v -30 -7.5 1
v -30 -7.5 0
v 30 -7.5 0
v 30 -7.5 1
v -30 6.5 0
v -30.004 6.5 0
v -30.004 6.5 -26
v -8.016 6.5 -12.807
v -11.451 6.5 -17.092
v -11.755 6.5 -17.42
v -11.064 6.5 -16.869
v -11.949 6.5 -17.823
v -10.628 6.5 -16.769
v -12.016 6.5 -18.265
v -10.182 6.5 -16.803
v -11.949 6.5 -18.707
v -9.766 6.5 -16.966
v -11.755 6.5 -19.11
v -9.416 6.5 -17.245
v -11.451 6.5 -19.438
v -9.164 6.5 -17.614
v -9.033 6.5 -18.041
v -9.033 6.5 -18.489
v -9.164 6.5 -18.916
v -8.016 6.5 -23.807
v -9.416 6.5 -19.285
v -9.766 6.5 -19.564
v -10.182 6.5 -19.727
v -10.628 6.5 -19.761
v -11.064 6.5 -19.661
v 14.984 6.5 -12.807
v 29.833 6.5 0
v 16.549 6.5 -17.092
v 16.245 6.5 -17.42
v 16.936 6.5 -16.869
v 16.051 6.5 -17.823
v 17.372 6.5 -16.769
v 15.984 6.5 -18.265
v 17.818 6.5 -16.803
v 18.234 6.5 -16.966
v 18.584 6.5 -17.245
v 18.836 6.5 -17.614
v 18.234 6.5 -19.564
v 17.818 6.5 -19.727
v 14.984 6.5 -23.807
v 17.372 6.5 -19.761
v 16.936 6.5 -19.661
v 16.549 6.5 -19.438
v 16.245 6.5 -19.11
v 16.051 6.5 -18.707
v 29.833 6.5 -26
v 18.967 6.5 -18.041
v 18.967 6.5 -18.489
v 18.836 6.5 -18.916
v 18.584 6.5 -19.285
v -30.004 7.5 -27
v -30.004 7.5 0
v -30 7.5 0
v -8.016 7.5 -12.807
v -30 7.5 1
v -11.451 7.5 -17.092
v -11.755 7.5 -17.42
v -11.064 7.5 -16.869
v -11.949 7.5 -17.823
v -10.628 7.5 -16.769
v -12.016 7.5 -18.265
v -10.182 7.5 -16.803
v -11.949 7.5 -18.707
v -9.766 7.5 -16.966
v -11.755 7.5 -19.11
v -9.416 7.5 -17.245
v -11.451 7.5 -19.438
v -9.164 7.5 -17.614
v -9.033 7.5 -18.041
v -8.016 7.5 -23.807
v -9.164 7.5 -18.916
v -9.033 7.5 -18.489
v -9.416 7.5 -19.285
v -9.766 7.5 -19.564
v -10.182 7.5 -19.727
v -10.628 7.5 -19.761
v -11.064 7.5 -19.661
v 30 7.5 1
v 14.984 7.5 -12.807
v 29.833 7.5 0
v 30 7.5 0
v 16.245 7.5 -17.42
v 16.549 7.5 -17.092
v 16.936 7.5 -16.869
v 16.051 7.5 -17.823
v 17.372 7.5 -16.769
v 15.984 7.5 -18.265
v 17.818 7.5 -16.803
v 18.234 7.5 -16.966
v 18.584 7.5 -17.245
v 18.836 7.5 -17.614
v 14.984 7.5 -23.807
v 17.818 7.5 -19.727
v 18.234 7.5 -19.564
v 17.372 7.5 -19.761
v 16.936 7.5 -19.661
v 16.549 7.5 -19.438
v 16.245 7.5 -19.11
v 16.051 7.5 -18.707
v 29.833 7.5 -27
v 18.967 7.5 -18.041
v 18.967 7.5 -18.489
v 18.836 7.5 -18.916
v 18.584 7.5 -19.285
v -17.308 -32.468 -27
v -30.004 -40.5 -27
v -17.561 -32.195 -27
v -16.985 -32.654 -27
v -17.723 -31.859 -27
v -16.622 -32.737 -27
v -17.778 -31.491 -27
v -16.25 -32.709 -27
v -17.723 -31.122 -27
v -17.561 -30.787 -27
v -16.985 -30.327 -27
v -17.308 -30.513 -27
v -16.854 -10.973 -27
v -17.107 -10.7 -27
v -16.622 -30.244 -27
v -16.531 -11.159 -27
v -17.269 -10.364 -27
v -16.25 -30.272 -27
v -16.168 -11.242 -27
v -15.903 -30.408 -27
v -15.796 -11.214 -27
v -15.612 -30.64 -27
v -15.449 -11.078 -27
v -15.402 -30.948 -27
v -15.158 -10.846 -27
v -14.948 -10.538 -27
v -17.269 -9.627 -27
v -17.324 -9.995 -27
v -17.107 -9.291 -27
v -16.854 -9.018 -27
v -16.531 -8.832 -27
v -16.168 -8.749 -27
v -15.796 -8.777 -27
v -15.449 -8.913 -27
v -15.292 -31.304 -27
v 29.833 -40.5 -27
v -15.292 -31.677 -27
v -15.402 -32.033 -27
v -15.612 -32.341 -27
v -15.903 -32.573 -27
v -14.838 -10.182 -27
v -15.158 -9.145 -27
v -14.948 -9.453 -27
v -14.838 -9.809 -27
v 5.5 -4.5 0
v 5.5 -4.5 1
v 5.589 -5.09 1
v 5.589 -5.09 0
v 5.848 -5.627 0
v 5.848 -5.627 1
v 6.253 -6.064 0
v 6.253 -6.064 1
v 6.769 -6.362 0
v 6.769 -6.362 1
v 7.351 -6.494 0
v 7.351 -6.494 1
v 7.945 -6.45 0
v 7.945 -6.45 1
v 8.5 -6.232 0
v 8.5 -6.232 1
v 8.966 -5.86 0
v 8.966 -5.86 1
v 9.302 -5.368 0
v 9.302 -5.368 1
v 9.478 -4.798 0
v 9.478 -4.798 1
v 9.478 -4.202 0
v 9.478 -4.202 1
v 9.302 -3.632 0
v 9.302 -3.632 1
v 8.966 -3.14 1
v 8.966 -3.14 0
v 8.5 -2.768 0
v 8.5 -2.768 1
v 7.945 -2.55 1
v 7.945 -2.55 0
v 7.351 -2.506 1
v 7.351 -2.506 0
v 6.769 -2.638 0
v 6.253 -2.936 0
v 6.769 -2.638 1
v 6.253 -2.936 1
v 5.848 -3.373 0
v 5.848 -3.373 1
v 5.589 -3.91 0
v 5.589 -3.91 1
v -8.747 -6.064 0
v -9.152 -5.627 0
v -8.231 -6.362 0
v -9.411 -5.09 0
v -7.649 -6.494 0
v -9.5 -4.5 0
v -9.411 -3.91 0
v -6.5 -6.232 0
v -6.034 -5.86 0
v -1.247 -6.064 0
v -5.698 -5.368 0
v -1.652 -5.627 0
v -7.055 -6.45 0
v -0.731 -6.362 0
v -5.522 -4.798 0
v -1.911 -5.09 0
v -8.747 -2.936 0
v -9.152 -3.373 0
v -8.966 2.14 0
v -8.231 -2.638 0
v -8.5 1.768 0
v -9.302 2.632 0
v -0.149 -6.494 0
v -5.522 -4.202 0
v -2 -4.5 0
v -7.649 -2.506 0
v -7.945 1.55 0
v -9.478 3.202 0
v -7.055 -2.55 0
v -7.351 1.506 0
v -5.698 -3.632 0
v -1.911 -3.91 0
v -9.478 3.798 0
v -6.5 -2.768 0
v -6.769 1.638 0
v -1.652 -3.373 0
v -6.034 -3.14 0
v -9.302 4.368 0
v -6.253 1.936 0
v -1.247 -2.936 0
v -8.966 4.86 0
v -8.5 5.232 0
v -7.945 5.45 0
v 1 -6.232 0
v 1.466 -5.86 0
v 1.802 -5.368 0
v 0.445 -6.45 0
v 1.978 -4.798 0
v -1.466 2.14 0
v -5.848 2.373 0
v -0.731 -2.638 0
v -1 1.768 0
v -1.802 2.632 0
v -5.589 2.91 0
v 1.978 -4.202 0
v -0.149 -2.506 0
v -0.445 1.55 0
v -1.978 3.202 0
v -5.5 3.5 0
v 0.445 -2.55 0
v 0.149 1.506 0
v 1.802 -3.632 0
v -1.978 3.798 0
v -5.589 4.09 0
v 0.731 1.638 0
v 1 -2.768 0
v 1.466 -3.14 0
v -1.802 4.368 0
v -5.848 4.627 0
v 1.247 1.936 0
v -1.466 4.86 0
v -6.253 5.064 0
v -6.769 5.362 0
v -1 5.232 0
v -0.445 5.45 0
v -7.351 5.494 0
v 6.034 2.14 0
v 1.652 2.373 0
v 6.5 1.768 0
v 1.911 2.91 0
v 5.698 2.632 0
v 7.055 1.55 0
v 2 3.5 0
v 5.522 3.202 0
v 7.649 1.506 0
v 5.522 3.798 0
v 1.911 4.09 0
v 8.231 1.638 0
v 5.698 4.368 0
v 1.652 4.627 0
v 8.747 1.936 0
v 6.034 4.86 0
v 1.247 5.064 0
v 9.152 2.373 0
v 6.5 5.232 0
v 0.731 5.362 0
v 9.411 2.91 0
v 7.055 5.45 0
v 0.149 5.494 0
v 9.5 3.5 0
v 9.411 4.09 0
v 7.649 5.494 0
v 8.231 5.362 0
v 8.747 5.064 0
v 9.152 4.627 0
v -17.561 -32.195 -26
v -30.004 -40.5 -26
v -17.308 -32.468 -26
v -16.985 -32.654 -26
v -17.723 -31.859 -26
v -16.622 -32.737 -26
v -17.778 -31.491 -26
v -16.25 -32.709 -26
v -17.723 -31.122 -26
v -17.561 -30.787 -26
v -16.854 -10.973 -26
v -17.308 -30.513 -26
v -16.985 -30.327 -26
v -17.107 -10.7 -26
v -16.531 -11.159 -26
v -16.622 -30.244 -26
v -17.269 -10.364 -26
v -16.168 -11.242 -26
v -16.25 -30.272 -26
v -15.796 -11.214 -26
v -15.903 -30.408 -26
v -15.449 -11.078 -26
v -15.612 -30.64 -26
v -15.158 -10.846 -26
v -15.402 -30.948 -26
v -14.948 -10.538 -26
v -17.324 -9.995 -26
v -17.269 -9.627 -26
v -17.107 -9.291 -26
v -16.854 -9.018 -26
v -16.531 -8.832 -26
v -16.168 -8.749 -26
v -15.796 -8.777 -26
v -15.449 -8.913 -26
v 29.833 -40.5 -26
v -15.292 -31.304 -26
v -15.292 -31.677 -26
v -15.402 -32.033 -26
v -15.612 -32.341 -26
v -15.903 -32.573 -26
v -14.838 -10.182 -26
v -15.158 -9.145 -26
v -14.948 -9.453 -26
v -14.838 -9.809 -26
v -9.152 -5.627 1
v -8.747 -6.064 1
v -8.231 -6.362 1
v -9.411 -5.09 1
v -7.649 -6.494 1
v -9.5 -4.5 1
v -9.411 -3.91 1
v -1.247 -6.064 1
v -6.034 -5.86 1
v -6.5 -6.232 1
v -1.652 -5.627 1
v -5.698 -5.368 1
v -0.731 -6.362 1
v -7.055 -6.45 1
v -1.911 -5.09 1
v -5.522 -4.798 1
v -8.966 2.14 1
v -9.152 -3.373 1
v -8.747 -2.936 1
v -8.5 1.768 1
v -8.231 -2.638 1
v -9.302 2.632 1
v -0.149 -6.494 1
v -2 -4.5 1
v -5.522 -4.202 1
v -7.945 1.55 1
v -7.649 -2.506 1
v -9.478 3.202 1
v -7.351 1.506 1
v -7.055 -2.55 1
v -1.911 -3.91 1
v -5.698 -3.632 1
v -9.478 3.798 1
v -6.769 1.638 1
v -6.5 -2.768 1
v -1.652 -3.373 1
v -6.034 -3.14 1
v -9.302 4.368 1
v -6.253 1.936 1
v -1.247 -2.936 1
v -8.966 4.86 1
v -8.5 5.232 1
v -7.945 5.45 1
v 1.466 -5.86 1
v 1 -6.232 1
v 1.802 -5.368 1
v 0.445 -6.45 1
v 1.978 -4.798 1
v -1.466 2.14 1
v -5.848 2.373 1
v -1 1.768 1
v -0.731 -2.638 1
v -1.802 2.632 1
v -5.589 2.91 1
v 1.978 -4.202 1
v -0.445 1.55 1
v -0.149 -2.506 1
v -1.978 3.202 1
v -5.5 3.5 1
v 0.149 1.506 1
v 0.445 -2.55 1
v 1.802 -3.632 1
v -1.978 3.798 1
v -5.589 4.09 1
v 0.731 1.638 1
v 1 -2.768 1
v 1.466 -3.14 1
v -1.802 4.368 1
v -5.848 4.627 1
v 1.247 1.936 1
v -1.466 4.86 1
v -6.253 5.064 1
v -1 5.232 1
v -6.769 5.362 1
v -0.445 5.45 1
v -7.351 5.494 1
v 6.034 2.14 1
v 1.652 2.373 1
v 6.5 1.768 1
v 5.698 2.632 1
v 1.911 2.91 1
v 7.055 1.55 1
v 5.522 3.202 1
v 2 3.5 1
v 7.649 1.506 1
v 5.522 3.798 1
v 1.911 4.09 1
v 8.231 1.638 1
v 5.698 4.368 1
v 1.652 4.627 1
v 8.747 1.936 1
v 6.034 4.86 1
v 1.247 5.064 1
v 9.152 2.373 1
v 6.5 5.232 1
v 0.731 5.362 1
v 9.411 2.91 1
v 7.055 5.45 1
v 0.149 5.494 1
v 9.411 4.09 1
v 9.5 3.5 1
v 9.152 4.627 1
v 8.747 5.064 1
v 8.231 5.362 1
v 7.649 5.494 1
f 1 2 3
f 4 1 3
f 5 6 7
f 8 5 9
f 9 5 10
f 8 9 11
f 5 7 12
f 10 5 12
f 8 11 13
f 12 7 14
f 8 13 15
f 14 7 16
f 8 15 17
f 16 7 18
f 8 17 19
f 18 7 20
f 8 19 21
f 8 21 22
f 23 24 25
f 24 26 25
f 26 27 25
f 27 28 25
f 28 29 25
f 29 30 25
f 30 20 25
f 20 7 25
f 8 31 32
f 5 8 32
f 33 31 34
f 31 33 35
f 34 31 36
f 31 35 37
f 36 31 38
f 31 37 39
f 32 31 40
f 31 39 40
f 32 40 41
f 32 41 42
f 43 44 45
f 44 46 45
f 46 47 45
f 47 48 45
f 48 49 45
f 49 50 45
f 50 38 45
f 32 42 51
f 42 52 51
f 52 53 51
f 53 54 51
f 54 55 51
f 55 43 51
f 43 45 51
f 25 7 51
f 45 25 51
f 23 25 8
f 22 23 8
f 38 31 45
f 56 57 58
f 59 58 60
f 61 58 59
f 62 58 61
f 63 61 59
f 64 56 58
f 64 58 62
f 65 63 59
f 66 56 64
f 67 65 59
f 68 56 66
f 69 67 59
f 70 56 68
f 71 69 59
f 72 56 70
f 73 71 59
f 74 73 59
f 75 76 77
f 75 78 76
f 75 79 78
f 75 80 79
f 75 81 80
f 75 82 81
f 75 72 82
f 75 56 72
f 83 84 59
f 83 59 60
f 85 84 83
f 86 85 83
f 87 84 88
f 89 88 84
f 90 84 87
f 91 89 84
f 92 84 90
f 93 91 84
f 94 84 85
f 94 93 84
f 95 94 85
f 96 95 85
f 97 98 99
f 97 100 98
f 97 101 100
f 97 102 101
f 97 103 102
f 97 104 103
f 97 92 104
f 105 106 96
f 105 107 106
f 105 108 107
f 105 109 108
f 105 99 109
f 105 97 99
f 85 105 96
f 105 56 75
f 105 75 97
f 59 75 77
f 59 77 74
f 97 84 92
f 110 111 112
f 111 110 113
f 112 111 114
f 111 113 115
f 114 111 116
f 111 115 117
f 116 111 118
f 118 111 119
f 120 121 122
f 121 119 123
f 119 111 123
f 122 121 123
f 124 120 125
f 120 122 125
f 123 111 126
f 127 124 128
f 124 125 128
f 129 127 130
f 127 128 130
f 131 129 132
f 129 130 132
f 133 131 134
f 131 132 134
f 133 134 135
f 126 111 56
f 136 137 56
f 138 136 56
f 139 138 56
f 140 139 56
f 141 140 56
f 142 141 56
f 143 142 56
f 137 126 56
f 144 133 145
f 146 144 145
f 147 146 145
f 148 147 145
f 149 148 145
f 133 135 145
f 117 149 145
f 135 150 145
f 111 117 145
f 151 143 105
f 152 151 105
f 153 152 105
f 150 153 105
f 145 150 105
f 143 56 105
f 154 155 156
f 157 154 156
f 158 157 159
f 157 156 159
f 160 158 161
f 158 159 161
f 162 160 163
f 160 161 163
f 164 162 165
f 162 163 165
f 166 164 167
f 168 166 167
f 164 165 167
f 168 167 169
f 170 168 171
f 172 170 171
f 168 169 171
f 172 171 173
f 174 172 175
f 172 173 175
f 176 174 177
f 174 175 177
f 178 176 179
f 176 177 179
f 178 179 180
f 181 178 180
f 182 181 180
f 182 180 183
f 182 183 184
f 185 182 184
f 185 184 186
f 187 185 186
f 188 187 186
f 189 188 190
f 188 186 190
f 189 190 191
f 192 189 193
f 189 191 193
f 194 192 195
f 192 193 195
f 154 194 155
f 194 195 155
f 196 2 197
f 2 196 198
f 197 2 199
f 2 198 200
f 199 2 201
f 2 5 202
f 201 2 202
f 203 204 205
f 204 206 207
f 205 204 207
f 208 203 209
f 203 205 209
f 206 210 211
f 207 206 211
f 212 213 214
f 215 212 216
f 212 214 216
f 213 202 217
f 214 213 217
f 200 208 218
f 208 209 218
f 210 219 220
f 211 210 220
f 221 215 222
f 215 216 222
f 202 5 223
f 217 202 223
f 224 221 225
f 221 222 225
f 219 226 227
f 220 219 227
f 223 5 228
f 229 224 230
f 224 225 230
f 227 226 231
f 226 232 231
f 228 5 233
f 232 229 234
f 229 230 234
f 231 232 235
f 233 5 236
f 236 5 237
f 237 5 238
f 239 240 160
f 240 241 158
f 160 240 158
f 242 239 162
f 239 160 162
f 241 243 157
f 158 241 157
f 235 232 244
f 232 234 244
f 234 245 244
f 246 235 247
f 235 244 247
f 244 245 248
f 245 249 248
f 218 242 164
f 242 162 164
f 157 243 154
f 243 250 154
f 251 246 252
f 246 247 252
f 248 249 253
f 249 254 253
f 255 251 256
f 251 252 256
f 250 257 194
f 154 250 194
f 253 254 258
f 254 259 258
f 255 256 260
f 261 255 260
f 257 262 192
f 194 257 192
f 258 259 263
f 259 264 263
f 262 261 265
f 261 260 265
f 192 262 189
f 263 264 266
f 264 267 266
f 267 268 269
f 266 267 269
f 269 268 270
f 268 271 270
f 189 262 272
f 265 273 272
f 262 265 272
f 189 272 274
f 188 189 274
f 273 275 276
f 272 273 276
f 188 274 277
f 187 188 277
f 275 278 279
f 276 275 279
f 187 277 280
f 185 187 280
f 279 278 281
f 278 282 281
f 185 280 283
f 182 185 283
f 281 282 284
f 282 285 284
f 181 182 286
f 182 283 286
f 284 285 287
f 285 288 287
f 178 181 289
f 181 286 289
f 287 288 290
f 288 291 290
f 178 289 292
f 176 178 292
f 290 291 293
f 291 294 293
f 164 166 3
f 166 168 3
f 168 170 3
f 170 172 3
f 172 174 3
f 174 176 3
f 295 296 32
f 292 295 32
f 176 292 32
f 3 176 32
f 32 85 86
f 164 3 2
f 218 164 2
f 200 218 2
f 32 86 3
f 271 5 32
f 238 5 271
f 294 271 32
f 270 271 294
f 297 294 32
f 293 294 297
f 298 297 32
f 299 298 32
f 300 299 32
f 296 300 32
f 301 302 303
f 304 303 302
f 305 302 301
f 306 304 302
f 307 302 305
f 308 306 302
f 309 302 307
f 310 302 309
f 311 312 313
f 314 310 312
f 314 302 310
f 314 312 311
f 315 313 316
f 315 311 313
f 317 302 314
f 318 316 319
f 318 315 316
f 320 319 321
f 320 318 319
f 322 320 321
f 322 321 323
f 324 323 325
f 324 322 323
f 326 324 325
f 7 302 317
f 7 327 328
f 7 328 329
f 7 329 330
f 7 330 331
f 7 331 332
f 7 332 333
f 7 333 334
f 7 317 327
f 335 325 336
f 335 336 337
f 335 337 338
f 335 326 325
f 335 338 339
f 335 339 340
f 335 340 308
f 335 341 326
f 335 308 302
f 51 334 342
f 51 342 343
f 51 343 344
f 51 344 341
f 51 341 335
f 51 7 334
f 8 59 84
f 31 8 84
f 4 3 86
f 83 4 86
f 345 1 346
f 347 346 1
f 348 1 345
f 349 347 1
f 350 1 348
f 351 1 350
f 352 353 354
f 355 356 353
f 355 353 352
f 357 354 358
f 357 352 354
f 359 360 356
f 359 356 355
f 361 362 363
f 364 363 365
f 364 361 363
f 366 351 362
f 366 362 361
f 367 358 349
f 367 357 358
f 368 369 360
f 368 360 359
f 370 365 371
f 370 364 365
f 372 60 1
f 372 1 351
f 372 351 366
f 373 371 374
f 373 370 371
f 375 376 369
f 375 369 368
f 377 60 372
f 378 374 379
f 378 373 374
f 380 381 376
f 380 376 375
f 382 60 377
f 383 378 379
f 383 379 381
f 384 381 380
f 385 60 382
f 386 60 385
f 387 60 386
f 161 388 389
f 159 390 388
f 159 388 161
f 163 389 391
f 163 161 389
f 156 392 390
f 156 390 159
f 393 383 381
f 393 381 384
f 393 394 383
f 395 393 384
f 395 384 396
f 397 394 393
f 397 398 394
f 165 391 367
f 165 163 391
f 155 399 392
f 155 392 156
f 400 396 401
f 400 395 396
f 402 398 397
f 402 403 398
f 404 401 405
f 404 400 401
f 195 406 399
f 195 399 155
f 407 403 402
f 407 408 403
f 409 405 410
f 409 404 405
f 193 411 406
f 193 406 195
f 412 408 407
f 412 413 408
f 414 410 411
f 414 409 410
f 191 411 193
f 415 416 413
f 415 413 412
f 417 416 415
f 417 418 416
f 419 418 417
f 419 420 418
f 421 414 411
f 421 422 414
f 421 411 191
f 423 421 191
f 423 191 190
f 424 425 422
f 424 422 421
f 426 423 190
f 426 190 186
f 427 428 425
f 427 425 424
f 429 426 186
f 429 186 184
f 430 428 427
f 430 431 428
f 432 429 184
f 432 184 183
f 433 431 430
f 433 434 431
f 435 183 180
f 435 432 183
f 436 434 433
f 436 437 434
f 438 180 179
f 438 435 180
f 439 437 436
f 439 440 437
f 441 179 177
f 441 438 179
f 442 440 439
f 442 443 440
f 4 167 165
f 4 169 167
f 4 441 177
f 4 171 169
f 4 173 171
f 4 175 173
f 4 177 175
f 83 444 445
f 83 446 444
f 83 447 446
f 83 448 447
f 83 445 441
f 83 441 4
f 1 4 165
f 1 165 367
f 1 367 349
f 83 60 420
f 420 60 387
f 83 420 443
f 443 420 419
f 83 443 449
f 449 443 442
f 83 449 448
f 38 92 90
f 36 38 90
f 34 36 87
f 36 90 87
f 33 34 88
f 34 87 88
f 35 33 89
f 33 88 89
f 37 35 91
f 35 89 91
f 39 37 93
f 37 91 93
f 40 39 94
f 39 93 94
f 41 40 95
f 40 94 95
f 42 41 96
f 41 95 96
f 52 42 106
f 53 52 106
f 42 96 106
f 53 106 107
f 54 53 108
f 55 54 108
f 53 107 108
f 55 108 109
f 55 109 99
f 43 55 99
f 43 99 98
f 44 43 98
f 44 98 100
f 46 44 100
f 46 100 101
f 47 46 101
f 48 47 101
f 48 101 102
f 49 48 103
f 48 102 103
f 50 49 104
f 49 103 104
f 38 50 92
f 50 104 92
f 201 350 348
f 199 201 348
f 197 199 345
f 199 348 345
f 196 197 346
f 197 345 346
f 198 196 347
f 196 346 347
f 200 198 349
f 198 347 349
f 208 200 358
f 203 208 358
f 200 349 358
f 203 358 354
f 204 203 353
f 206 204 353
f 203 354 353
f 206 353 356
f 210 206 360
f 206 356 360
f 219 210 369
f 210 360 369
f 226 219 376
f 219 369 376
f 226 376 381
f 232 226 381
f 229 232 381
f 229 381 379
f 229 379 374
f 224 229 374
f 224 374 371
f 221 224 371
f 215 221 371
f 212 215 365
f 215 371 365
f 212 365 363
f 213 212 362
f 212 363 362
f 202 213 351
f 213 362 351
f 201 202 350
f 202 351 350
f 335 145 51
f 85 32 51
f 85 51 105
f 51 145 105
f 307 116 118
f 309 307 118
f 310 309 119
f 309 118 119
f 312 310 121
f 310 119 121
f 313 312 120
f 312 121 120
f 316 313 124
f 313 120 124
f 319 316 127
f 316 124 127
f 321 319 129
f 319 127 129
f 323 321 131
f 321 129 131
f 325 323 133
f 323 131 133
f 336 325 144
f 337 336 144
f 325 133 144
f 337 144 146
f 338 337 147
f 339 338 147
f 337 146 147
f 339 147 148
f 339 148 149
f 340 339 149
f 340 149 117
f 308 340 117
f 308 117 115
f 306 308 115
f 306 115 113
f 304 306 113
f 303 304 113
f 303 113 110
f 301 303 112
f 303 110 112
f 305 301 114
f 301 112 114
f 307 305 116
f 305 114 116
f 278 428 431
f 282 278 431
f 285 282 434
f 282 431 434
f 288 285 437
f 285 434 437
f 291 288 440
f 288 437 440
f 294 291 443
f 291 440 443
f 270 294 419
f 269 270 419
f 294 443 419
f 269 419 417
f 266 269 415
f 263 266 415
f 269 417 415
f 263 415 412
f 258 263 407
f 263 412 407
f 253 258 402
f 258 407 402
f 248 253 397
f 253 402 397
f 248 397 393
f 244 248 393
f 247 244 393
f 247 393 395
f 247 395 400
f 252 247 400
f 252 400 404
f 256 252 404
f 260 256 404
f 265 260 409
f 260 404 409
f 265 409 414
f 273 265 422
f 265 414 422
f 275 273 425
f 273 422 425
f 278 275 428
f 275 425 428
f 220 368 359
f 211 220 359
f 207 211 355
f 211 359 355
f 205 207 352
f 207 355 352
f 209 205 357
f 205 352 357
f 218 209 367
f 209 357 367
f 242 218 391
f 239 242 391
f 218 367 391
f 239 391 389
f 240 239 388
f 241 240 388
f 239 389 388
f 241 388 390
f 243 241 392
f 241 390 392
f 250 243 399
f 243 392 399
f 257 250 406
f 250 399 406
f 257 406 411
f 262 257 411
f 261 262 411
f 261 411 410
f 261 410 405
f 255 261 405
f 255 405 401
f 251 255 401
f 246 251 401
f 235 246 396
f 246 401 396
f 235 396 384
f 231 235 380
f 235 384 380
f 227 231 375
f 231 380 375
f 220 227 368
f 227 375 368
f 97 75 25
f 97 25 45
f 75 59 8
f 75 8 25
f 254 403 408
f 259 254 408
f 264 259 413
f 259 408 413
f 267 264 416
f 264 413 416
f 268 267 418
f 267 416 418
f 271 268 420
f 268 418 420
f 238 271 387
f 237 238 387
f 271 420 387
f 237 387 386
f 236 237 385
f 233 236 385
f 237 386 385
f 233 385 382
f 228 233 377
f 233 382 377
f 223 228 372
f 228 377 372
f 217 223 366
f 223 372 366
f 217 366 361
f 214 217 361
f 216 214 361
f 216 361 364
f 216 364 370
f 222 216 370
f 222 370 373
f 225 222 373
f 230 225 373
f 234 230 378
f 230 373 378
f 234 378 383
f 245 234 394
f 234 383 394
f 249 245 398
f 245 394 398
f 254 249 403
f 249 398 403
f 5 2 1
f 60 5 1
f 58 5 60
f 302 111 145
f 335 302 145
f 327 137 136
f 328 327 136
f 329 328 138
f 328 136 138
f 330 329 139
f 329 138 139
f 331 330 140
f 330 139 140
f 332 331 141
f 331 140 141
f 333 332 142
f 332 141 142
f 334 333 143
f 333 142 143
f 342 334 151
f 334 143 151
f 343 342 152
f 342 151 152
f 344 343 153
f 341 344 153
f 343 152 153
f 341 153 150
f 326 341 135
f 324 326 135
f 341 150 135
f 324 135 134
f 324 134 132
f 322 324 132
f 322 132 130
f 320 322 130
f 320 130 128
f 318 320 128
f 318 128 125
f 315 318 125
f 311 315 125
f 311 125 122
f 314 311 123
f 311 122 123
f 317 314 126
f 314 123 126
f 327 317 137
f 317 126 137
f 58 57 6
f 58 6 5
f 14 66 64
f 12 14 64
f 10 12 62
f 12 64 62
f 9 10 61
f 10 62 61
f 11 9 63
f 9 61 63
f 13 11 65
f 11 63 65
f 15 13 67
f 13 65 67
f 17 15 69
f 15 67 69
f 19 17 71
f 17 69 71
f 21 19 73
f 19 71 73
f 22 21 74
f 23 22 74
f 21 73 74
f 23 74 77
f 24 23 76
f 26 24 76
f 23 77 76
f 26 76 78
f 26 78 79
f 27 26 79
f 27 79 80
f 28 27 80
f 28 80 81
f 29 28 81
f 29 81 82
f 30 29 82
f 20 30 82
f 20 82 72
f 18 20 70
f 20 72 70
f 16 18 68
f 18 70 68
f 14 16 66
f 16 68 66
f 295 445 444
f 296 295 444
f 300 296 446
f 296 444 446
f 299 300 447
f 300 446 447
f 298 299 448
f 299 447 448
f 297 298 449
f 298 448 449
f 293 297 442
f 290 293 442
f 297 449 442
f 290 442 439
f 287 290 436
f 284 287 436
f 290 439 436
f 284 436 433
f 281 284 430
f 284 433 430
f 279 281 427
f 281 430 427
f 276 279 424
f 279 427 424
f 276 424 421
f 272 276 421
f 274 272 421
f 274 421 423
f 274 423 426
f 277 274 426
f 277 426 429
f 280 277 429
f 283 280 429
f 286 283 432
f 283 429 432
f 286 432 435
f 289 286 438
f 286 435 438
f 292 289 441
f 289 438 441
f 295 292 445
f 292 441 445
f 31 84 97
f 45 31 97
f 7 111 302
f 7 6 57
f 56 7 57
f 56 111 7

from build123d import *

# Parameters (mm, degrees)
ESQUISSE1_W             = 60
ESQUISSE1_H             = 15
BOSS_EXTRU_1_DEPTH      = 1
ESQUISSE2_W             = 59.836868209
ESQUISSE2_H             = 27
BOSS_EXTRU_2_DEPTH      = 1
ESQUISSE4_W             = 59.836868209
ESQUISSE4_H             = 47
BOSS_EXTRU_3_DEPTH      = 1
ESQUISSE6_R             = 2
ENL_V_MAT_EXTRU_5_DEPTH = 1
ESQUISSE8_W             = 23
ESQUISSE8_H             = 11
ENL_V_MAT_EXTRU_7_DEPTH = 1
ESQUISSE9_R             = 1.5
ENL_V_MAT_EXTRU_8_DEPTH = 1
ESQUISSE10_R            = 1.25
ENL_V_MAT_EXTRU_9_DEPTH = 1


with BuildPart() as part:
    # Esquisse1 → Boss.-Extru.1 (new body)
    with BuildSketch(Plane.XY):
        Rectangle(ESQUISSE1_W, ESQUISSE1_H)
    extrude(amount=BOSS_EXTRU_1_DEPTH)

    # Esquisse2 → Boss.-Extru.2 (add)
    with BuildSketch(Plane(origin=(0, 7.5, 0), x_dir=(1, 0, 0), z_dir=(0, 1, 0))):
        with Locations((-0.085609374, 13.5)):
            Rectangle(ESQUISSE2_W, ESQUISSE2_H)
    extrude(amount=-BOSS_EXTRU_2_DEPTH)

    # Esquisse4 → Boss.-Extru.3 (add)
    with BuildSketch(Plane.XY.offset(-27)):
        with Locations((-0.085609374, -17)):
            Rectangle(ESQUISSE4_W, ESQUISSE4_H)
    extrude(amount=BOSS_EXTRU_3_DEPTH)

    # Esquisse6 → Enlèv. mat.-Extru.5 (cut)
    with BuildSketch(Plane.XY.offset(1)):
        with Locations((-7.5, 3.5)):
            Circle(ESQUISSE6_R)
        with Locations((0, 3.5)):
            Circle(ESQUISSE6_R)
        with Locations((7.5, 3.5)):
            Circle(ESQUISSE6_R)
        with Locations(Location((7.5, -4.5, 0), (0, 0, 180))):
            Circle(ESQUISSE6_R)
        with Locations(Location((0, -4.5, 0), (0, 0, 180))):
            Circle(ESQUISSE6_R)
        with Locations(Location((-7.5, -4.5, 0), (0, 0, 180))):
            Circle(ESQUISSE6_R)
    extrude(amount=-ENL_V_MAT_EXTRU_5_DEPTH, mode=Mode.SUBTRACT)

    # Esquisse8 → Enlèv. mat.-Extru.7 (cut)
    with BuildSketch(Plane(origin=(0, 7.5, 0), x_dir=(1, 0, 0), z_dir=(0, 1, 0))):
        with Locations((3.484076767, 18.307447957)):
            Rectangle(ESQUISSE8_W, ESQUISSE8_H)
    extrude(amount=-ENL_V_MAT_EXTRU_7_DEPTH, mode=Mode.SUBTRACT)

    # Esquisse9 → Enlèv. mat.-Extru.8 (cut)
    with BuildSketch(Plane(origin=(0, 7.5, 0), x_dir=(1, 0, 0), z_dir=(0, 1, 0))):
        with Locations(Location((17.484076767, 18.264970918, 0), (0, 0, 180))):
            Circle(ESQUISSE9_R)
        with Locations(Location((-10.515923233, 18.264970918, 0), (0, 0, 180))):
            Circle(ESQUISSE9_R)
    extrude(amount=-ENL_V_MAT_EXTRU_8_DEPTH, mode=Mode.SUBTRACT)

    # Esquisse10 → Enlèv. mat.-Extru.9 (cut)
    with BuildSketch(Plane(origin=(0, 0, -27), x_dir=(-1, 0, 0), z_dir=(0, 0, -1))):
        with Locations((16.528262126, -31.490674341)):
            Circle(ESQUISSE10_R)
        with Locations((16.074327743, -9.995466885)):
            Circle(ESQUISSE10_R)
    extrude(amount=-ENL_V_MAT_EXTRU_9_DEPTH, mode=Mode.SUBTRACT)


solid = part.part
